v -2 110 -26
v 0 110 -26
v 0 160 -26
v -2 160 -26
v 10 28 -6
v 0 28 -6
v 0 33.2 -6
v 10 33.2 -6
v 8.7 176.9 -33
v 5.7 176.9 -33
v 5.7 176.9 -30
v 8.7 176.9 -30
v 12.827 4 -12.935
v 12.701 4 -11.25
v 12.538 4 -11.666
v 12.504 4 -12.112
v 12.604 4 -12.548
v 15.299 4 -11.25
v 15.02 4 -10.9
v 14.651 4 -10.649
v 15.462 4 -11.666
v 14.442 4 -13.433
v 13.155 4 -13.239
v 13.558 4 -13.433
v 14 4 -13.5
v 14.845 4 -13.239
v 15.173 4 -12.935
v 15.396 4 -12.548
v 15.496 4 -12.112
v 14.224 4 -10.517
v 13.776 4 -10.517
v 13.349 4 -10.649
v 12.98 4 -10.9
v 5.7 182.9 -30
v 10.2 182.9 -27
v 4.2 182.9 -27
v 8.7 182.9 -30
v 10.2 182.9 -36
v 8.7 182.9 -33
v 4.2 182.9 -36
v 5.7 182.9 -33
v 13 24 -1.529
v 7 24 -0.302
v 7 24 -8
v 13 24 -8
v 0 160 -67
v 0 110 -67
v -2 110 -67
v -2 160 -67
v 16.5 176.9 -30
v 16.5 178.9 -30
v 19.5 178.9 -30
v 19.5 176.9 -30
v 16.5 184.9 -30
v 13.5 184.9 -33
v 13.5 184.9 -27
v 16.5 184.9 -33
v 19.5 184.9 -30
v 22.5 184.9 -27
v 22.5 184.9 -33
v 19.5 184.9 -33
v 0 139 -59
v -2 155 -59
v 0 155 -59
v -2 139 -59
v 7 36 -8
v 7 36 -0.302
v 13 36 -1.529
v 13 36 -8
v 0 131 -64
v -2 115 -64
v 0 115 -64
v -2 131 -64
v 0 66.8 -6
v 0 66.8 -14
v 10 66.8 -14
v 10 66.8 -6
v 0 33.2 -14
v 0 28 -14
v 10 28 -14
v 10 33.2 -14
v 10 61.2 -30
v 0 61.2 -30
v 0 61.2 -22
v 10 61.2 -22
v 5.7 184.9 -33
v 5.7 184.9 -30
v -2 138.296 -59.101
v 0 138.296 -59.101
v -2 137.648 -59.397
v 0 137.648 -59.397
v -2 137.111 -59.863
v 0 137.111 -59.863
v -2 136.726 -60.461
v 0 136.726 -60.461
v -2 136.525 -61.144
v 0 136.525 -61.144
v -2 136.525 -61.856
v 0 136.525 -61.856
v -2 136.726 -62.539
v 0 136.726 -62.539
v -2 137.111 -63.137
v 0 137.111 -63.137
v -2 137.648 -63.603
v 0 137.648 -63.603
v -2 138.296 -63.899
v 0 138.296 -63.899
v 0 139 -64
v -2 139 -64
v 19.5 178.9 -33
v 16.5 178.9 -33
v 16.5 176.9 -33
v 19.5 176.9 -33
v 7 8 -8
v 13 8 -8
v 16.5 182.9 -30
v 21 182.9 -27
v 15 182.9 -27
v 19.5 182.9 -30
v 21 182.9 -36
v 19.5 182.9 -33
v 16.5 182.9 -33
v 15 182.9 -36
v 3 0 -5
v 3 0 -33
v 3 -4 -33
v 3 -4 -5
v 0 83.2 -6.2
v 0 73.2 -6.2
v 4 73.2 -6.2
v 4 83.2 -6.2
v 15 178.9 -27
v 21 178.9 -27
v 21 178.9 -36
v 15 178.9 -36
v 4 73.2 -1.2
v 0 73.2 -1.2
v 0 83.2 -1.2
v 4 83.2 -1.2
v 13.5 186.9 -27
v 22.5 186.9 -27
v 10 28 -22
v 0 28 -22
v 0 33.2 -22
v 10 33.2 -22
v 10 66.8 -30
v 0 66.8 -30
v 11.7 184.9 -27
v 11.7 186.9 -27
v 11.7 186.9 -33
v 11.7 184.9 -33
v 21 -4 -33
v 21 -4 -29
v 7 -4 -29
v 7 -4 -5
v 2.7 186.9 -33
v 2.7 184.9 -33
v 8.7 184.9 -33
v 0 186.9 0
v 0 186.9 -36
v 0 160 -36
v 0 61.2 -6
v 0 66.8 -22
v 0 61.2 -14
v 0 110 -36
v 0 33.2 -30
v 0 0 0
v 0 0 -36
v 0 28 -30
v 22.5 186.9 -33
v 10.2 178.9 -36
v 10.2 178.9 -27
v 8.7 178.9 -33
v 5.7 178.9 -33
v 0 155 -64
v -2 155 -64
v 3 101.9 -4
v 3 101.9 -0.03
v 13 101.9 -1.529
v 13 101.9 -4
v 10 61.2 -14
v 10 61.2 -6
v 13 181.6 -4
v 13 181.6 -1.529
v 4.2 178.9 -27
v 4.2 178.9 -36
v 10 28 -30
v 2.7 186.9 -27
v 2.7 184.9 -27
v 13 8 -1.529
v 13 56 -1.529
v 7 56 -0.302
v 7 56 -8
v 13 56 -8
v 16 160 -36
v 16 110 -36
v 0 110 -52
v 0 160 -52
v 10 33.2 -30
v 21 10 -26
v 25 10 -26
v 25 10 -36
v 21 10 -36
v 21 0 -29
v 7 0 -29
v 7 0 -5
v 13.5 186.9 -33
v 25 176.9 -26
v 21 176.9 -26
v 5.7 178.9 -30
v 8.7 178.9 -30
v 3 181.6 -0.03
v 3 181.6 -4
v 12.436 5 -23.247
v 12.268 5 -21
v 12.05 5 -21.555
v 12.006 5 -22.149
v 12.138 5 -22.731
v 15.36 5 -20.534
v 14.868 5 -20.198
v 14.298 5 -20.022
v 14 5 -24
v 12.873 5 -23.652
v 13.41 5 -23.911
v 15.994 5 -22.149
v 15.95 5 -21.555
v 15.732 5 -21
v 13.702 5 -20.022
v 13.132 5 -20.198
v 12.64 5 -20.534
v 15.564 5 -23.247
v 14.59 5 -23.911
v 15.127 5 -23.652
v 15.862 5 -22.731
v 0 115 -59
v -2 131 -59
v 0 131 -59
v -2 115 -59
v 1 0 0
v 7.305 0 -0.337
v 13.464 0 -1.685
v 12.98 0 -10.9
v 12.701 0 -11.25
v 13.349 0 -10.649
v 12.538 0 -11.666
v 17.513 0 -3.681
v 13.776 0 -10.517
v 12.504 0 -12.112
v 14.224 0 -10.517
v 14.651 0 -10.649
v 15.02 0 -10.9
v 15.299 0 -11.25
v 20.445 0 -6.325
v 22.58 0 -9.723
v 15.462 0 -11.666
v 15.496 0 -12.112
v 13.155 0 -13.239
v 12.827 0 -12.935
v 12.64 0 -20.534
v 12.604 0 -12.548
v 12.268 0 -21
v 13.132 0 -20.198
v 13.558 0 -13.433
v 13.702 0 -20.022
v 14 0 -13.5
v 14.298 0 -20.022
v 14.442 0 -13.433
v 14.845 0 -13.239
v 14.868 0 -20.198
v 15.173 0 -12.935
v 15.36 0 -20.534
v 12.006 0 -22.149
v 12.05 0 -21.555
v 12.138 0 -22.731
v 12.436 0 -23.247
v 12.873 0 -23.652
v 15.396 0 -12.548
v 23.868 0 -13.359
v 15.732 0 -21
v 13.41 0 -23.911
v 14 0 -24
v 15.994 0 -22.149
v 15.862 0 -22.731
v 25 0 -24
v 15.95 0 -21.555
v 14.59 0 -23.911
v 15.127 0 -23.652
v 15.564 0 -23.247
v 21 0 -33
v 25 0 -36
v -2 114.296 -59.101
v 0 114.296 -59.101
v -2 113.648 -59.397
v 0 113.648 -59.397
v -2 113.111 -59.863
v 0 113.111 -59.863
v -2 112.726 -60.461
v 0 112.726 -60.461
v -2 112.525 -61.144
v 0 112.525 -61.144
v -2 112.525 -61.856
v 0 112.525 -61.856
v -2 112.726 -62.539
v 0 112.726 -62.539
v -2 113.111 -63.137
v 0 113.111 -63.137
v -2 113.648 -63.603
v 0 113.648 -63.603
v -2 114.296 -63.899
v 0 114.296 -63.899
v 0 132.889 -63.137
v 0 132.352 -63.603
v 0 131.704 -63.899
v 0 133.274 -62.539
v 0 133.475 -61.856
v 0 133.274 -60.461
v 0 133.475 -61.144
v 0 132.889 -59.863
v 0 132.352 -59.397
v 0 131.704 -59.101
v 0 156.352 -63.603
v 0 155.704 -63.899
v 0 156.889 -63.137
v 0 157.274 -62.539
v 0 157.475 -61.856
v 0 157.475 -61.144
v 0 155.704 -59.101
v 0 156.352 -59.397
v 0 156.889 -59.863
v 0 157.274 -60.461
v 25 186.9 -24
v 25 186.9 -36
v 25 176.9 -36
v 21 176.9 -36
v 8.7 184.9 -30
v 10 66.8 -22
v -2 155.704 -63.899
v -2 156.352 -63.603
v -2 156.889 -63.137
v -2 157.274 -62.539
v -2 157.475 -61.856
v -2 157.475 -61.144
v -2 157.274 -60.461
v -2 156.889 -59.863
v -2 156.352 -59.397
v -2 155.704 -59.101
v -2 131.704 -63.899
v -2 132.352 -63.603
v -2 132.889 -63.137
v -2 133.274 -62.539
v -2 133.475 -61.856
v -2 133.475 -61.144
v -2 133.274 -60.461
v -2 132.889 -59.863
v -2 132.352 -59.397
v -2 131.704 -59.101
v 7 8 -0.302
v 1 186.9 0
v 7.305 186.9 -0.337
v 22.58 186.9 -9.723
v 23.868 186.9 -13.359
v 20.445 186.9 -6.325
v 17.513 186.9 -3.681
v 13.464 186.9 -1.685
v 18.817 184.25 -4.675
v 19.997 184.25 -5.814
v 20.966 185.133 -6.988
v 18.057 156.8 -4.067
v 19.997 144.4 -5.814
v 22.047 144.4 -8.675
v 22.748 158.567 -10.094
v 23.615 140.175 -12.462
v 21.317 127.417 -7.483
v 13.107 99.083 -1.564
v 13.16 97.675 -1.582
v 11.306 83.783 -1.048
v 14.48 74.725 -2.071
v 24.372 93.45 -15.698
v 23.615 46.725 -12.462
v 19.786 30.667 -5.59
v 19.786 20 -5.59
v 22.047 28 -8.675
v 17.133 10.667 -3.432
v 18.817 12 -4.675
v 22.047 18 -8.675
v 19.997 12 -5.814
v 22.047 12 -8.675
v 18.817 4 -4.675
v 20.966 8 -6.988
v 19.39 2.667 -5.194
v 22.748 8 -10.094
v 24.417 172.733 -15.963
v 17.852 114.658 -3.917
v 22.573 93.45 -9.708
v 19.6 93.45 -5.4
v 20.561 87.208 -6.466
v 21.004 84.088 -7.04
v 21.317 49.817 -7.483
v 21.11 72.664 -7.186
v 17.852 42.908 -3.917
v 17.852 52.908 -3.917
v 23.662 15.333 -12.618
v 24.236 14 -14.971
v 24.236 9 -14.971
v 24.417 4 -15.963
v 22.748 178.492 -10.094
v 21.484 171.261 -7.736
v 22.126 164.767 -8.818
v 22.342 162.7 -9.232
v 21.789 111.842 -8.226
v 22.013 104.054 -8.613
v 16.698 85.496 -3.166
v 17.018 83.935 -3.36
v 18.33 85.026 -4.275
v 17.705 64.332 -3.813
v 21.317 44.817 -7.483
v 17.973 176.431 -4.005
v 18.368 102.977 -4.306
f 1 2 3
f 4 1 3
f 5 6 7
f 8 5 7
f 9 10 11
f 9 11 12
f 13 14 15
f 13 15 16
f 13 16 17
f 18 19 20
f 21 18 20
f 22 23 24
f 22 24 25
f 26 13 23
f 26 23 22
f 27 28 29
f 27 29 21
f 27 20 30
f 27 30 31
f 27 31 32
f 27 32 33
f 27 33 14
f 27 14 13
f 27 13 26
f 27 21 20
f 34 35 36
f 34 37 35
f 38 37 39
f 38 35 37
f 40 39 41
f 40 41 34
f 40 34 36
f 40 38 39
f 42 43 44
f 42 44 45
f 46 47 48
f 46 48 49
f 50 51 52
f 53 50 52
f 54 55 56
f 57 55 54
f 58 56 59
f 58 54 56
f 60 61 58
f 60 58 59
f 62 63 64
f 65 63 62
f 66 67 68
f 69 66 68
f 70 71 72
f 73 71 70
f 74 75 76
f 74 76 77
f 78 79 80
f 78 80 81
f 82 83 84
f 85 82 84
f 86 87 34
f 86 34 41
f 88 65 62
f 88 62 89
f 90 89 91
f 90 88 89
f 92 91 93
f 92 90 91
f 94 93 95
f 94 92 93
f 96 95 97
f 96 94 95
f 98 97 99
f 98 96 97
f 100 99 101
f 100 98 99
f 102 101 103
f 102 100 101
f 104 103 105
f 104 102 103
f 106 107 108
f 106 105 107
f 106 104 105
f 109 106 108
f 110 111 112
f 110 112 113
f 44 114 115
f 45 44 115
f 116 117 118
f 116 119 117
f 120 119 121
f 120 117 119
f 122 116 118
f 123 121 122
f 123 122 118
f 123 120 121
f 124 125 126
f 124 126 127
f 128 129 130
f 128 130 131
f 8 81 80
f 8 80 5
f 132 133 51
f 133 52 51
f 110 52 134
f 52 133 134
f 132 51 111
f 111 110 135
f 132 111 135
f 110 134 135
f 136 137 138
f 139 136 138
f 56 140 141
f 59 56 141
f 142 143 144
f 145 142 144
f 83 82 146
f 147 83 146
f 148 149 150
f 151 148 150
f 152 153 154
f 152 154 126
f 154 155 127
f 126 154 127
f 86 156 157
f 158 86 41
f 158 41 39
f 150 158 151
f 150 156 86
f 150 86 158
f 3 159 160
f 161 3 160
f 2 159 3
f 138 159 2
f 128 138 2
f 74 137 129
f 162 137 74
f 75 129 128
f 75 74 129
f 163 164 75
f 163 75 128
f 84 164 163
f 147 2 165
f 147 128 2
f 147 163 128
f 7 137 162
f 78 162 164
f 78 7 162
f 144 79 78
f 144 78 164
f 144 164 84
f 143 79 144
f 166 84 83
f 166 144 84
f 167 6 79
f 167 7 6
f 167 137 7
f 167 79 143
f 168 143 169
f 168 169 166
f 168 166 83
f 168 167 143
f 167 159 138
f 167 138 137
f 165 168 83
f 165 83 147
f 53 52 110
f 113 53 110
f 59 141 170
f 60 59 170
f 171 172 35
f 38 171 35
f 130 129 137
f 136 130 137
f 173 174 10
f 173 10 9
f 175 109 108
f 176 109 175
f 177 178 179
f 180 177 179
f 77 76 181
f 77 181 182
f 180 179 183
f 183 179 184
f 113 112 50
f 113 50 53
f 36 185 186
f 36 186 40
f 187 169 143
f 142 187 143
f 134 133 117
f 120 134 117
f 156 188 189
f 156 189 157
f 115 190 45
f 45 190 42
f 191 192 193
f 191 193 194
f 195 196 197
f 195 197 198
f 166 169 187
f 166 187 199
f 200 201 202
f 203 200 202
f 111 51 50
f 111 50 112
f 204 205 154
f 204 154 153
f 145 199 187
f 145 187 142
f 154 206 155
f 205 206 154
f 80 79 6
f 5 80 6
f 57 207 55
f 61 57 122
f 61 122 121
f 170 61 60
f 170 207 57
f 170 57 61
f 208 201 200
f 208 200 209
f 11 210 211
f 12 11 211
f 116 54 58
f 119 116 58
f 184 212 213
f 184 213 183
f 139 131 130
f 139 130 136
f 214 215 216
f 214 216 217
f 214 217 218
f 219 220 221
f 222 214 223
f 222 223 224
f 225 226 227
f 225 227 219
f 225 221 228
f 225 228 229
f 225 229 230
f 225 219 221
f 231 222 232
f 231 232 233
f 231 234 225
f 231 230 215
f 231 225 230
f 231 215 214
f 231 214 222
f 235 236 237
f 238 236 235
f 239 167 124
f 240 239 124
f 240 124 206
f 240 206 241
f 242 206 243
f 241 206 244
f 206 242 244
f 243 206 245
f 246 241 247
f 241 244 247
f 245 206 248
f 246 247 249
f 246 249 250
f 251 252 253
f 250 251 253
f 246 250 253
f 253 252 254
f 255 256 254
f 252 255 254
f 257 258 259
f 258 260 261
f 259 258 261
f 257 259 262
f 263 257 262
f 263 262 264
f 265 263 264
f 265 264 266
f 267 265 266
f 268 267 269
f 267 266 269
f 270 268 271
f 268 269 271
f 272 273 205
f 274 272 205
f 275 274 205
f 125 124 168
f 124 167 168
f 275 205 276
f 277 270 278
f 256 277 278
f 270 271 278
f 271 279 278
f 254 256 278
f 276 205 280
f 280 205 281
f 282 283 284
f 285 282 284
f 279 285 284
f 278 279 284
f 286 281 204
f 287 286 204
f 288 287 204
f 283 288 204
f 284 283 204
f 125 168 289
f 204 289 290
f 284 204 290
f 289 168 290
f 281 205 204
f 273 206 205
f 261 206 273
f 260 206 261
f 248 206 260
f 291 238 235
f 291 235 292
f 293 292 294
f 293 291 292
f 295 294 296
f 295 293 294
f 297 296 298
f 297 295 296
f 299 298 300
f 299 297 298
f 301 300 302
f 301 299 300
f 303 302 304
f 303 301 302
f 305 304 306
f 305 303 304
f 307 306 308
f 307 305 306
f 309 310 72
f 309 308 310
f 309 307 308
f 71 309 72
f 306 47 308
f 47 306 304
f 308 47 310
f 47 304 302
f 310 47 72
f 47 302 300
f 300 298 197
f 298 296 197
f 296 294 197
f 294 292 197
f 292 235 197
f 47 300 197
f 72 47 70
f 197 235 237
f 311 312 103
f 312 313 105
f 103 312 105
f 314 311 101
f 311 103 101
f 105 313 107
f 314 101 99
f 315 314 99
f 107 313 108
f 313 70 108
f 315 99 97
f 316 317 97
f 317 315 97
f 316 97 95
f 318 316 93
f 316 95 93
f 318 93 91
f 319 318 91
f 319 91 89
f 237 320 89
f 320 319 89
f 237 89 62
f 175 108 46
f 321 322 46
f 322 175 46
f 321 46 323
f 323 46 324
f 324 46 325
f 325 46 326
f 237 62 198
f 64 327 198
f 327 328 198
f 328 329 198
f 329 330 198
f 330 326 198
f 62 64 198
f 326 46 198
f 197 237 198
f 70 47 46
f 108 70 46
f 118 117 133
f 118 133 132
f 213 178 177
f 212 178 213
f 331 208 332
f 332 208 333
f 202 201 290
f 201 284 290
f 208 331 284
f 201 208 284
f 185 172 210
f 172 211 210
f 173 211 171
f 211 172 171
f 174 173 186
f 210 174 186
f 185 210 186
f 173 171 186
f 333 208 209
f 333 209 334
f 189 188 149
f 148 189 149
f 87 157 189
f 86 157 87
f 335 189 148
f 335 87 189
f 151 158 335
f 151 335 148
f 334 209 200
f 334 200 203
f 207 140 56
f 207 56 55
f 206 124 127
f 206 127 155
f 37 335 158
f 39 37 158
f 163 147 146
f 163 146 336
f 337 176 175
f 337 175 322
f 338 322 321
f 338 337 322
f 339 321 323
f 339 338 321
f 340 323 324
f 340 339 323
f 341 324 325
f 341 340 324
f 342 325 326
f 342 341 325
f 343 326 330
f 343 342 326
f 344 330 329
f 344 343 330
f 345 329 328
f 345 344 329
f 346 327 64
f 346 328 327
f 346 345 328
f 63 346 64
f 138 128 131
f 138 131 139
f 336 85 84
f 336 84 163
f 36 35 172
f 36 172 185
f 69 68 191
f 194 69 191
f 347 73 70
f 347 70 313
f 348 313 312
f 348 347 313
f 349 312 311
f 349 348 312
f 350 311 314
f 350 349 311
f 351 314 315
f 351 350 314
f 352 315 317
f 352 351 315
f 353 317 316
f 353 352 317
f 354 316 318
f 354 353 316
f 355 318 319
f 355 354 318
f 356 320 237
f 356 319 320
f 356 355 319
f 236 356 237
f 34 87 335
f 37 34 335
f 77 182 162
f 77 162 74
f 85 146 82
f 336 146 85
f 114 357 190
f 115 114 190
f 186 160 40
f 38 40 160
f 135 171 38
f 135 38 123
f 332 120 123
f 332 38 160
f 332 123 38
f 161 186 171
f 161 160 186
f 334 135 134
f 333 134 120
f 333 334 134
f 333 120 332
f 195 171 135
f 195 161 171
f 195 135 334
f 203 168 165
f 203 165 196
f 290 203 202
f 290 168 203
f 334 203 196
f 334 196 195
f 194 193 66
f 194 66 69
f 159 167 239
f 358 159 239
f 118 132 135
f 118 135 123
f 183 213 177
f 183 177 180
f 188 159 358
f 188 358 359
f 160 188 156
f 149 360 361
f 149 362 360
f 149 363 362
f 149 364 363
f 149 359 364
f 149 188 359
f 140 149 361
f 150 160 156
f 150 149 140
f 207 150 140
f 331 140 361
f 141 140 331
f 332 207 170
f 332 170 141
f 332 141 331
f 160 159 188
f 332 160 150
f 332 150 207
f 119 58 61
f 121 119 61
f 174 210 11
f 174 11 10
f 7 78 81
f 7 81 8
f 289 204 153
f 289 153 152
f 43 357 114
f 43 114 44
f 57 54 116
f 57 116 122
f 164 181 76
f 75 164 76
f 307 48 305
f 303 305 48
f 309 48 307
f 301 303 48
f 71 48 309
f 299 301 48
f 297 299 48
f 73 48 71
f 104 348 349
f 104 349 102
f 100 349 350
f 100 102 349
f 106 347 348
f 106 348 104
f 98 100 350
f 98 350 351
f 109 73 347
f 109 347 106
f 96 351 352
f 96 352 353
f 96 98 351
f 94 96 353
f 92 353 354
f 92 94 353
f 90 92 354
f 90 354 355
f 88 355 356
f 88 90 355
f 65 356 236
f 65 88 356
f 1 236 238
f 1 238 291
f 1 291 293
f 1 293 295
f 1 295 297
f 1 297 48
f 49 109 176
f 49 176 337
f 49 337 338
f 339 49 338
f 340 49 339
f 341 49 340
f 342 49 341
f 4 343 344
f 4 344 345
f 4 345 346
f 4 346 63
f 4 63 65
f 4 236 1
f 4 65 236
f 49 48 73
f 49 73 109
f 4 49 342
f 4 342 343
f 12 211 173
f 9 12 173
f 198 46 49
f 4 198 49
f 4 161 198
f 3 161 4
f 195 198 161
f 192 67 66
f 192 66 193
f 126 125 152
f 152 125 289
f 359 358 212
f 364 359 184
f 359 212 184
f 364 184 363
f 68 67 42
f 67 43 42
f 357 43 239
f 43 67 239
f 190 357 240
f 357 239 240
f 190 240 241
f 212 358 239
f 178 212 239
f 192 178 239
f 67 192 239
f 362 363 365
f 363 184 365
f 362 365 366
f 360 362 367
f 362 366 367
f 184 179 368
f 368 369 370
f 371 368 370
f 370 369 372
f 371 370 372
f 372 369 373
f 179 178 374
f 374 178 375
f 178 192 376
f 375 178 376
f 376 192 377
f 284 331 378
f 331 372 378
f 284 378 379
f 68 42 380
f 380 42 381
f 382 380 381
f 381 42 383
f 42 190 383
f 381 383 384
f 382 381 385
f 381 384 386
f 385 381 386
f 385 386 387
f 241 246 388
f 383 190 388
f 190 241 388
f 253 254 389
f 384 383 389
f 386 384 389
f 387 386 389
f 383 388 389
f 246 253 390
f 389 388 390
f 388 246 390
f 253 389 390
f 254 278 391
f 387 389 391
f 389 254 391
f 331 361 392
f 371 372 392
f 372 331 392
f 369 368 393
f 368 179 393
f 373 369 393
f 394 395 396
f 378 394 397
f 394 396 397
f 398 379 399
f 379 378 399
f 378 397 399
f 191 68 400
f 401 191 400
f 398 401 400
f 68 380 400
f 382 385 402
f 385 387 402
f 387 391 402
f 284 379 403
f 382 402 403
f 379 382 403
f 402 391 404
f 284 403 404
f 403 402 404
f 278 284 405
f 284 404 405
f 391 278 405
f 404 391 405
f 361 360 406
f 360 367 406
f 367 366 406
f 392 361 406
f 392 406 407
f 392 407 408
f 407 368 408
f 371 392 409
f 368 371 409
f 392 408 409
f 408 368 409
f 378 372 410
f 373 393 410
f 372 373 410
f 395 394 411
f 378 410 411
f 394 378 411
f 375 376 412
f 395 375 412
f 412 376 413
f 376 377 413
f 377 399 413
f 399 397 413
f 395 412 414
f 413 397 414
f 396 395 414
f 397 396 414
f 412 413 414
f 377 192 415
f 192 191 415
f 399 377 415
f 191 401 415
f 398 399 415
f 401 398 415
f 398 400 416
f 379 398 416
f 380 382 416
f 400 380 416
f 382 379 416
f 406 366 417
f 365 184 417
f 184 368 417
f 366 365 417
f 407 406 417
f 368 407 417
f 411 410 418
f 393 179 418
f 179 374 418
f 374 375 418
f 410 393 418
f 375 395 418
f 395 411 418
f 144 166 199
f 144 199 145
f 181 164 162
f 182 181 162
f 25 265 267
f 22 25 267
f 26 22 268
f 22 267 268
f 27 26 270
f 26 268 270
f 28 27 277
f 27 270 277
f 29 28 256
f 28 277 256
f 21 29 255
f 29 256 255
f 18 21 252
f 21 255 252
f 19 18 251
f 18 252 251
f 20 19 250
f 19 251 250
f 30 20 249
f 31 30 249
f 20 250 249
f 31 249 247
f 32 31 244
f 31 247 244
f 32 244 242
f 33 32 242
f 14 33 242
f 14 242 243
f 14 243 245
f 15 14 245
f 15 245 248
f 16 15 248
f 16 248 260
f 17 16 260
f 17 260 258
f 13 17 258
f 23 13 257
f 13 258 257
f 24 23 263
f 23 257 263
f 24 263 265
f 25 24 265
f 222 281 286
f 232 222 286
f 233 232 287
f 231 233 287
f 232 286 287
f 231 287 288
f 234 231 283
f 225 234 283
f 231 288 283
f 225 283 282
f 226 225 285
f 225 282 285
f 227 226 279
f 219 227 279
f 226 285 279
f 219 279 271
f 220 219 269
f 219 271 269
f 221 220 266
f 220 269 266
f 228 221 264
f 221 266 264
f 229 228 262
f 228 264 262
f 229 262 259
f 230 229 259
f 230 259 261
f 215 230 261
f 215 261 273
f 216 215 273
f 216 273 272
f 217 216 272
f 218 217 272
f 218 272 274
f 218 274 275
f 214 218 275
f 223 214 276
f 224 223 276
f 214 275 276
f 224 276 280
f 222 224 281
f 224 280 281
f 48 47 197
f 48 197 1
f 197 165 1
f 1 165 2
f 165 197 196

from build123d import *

# Parameters (mm, degrees)
SKETCH1_W           = 25
SKETCH1_H           = 36
BOSS_EXTRUDE1_DEPTH = 186.9
FILLET1_SIZE        = 24
SKETCH2_W           = 5
SKETCH2_H           = 10
CUT_EXTRUDE1_DEPTH  = 4
SKETCH3_W           = 8
SKETCH3_H           = 5.2
SKETCH3_H_2         = 5.6
CUT_EXTRUDE2_DEPTH  = 10
SKETCH4_W           = 41
SKETCH4_H           = 50
BOSS_EXTRUDE2_DEPTH = 2
CUT_EXTRUDE3_REACH  = 202.374
CHAMFER1_SIZE       = 16
SKETCH6_W           = 6
SKETCH6_H           = 4
CUT_EXTRUDE4_DEPTH  = 9
SKETCH7_W           = 3
SKETCH7_H           = 3
CUT_EXTRUDE5_DEPTH  = 10
BOSS_EXTRUDE3_DEPTH = 4
SKETCH9_R           = 2
CUT_EXTRUDE6_DEPTH  = 5
SKETCH10_R          = 1.5
CUT_EXTRUDE7_DEPTH  = 4
SKETCH11_W          = 6
SKETCH11_H          = 16
SKETCH11_H_2        = 20
CUT_EXTRUDE8_DEPTH  = 8
SKETCH12_W          = 10
SKETCH12_H          = 79.7
CUT_EXTRUDE9_DEPTH  = 4
SKETCH13_W          = 10
SKETCH13_H          = 166.9
CUT_EXTRUDE10_DEPTH = 4
SKETCH14_W          = 9
SKETCH14_H          = 6
CUT_EXTRUDE11_DEPTH = 2


with BuildPart() as part:
    # Sketch1 → Boss-Extrude1 (new body)
    with BuildSketch(Plane(origin=(0, 0, 0), x_dir=(1, 0, 0), z_dir=(0, 1, 0))):
        with Locations((12.5, 18)):
            Rectangle(SKETCH1_W, SKETCH1_H)
    extrude(amount=BOSS_EXTRUDE1_DEPTH)

    # Fillet1
    # a fillet whose section is not a circle: 24 mm, written as the material it takes off along each edge
    with BuildSketch(Plane(origin=(25, -60, 0), x_dir=(-1, 0, 0), z_dir=(0, 1, 0))) as fillet1_piece_1:
        with BuildLine():
            Bezier((FILLET1_SIZE, 0), (0, 0), (0, -FILLET1_SIZE), weights=[1, 1.222222222, 1])
            Line((0, -FILLET1_SIZE), (0, 0))
            Line((0, 0), (FILLET1_SIZE, 0))
        make_face()
    extrude(amount=306.9, mode=Mode.SUBTRACT)

    # Sketch2 → Cut-Extrude1 (cut)
    with BuildSketch(Plane.ZY):
        with Locations((-3.7, 78.2)):
            Rectangle(SKETCH2_W, SKETCH2_H)
    extrude(amount=-CUT_EXTRUDE1_DEPTH, mode=Mode.SUBTRACT)

    # Sketch3 → Cut-Extrude2 (cut)
    with BuildSketch(Plane.ZY):
        with Locations((-10, 30.6)):
            Rectangle(SKETCH3_W, SKETCH3_H)
        with Locations((-26, 30.6)):
            Rectangle(SKETCH3_W, SKETCH3_H)
        with Locations((-10, 64)):
            Rectangle(SKETCH3_W, SKETCH3_H_2)
        with Locations((-26, 64)):
            Rectangle(SKETCH3_W, SKETCH3_H_2)
    extrude(amount=-CUT_EXTRUDE2_DEPTH, mode=Mode.SUBTRACT)

    # Sketch4 → Boss-Extrude2 (add)
    with BuildSketch(Plane.ZY):
        with Locations((-46.5, 135)):
            Rectangle(SKETCH4_W, SKETCH4_H)
    extrude(amount=BOSS_EXTRUDE2_DEPTH)

    # Sketch5 → Cut-Extrude3 (cut, up to next)
    with BuildSketch(Plane.ZY.offset(2), mode=Mode.PRIVATE) as cut_extrude3_sk1:
        with BuildLine():
            Line((-59, 131), (-59, 115))
            ThreePointArc((-59, 115), (-61.5, 112.5), (-64, 115))
            Line((-64, 115), (-64, 131))
            ThreePointArc((-64, 131), (-61.5, 133.5), (-59, 131))
        make_face()
    cut_extrude3_tool1 = extrude(cut_extrude3_sk1.sketch, amount=-CUT_EXTRUDE3_REACH, mode=Mode.PRIVATE) & part.part
    # Sketch5 → Cut-Extrude3 (cut, up to next)
    with BuildSketch(Plane.ZY.offset(2), mode=Mode.PRIVATE) as cut_extrude3_sk2:
        with BuildLine():
            Line((-64, 139), (-64, 155))
            ThreePointArc((-64, 155), (-61.5, 157.5), (-59, 155))
            Line((-59, 155), (-59, 139))
            ThreePointArc((-59, 139), (-61.5, 136.5), (-64, 139))
        make_face()
    cut_extrude3_tool2 = extrude(cut_extrude3_sk2.sketch, amount=-CUT_EXTRUDE3_REACH, mode=Mode.PRIVATE) & part.part
    add(cut_extrude3_tool1.solids().sort_by_distance((-2, 123, -61.5))[0], mode=Mode.SUBTRACT)
    add(cut_extrude3_tool2.solids().sort_by_distance((-2, 147, -61.5))[0], mode=Mode.SUBTRACT)

    # Chamfer1
    chamfer1_edges = [part.edges().sort_by_distance(p)[0] for p in [
        (0, 135, -36),
    ]]
    chamfer(chamfer1_edges, length=CHAMFER1_SIZE)

    # Sketch6 → Cut-Extrude4 (cut)
    with BuildSketch(Plane(origin=(0, 0, -36), x_dir=(-1, 0, 0), z_dir=(0, 0, -1))):
        with Locations((-18, 180.9)):
            Rectangle(SKETCH6_W, SKETCH6_H)
        with Locations((-7.2, 180.9)):
            Rectangle(SKETCH6_W, SKETCH6_H)
    extrude(amount=-CUT_EXTRUDE4_DEPTH, mode=Mode.SUBTRACT)

    # Sketch7 → Cut-Extrude5 (cut)
    with BuildSketch(Plane(origin=(0, 186.9, 0), x_dir=(1, 0, 0), z_dir=(0, 1, 0))):
        with Locations((18, 31.5)):
            Rectangle(SKETCH7_W, SKETCH7_H)
        with Locations((7.2, 31.5)):
            Rectangle(SKETCH7_W, SKETCH7_H)
    extrude(amount=-CUT_EXTRUDE5_DEPTH, mode=Mode.SUBTRACT)

    # Sketch8 → Boss-Extrude3 (add)
    with BuildSketch(Plane.XZ):
        Polygon((3, -5), (7, -5), (7, -29), (21, -29), (21, -33), (7, -33), (3, -33), align=None)
    extrude(amount=BOSS_EXTRUDE3_DEPTH)

    # Sketch9 → Cut-Extrude6 (cut)
    with BuildSketch(Plane.XZ):
        with Locations(Location((14, -22, 0), (0, 0, 270))):
            Circle(SKETCH9_R)
    extrude(amount=-CUT_EXTRUDE6_DEPTH, mode=Mode.SUBTRACT)

    # Sketch10 → Cut-Extrude7 (cut)
    with BuildSketch(Plane.XZ):
        with Locations(Location((14, -12, 0), (0, 0, 270))):
            Circle(SKETCH10_R)
    extrude(amount=-CUT_EXTRUDE7_DEPTH, mode=Mode.SUBTRACT)

    # Sketch11 → Cut-Extrude8 (cut)
    with BuildSketch(Plane.XY):
        with Locations((10, 16)):
            Rectangle(SKETCH11_W, SKETCH11_H)
        with Locations((10, 46)):
            Rectangle(SKETCH11_W, SKETCH11_H_2)
    extrude(amount=-CUT_EXTRUDE8_DEPTH, mode=Mode.SUBTRACT)

    # Sketch12 → Cut-Extrude9 (cut)
    with BuildSketch(Plane.XY):
        with Locations((8, 141.75)):
            Rectangle(SKETCH12_W, SKETCH12_H)
    extrude(amount=-CUT_EXTRUDE9_DEPTH, mode=Mode.SUBTRACT)

    # Sketch13 → Cut-Extrude10 (cut)
    with BuildSketch(Plane(origin=(25, 0, 0), x_dir=(0, 0, -1), z_dir=(1, 0, 0))):
        with Locations((31, 93.45)):
            Rectangle(SKETCH13_W, SKETCH13_H)
    extrude(amount=-CUT_EXTRUDE10_DEPTH, mode=Mode.SUBTRACT)

    # Sketch14 → Cut-Extrude11 (cut)
    with BuildSketch(Plane(origin=(0, 186.9, 0), x_dir=(1, 0, 0), z_dir=(0, 1, 0))):
        with Locations((7.2, 30)):
            Rectangle(SKETCH14_W, SKETCH14_H)
        with Locations((18, 30)):
            Rectangle(SKETCH14_W, SKETCH14_H)
    extrude(amount=-CUT_EXTRUDE11_DEPTH, mode=Mode.SUBTRACT)


solid = part.part
